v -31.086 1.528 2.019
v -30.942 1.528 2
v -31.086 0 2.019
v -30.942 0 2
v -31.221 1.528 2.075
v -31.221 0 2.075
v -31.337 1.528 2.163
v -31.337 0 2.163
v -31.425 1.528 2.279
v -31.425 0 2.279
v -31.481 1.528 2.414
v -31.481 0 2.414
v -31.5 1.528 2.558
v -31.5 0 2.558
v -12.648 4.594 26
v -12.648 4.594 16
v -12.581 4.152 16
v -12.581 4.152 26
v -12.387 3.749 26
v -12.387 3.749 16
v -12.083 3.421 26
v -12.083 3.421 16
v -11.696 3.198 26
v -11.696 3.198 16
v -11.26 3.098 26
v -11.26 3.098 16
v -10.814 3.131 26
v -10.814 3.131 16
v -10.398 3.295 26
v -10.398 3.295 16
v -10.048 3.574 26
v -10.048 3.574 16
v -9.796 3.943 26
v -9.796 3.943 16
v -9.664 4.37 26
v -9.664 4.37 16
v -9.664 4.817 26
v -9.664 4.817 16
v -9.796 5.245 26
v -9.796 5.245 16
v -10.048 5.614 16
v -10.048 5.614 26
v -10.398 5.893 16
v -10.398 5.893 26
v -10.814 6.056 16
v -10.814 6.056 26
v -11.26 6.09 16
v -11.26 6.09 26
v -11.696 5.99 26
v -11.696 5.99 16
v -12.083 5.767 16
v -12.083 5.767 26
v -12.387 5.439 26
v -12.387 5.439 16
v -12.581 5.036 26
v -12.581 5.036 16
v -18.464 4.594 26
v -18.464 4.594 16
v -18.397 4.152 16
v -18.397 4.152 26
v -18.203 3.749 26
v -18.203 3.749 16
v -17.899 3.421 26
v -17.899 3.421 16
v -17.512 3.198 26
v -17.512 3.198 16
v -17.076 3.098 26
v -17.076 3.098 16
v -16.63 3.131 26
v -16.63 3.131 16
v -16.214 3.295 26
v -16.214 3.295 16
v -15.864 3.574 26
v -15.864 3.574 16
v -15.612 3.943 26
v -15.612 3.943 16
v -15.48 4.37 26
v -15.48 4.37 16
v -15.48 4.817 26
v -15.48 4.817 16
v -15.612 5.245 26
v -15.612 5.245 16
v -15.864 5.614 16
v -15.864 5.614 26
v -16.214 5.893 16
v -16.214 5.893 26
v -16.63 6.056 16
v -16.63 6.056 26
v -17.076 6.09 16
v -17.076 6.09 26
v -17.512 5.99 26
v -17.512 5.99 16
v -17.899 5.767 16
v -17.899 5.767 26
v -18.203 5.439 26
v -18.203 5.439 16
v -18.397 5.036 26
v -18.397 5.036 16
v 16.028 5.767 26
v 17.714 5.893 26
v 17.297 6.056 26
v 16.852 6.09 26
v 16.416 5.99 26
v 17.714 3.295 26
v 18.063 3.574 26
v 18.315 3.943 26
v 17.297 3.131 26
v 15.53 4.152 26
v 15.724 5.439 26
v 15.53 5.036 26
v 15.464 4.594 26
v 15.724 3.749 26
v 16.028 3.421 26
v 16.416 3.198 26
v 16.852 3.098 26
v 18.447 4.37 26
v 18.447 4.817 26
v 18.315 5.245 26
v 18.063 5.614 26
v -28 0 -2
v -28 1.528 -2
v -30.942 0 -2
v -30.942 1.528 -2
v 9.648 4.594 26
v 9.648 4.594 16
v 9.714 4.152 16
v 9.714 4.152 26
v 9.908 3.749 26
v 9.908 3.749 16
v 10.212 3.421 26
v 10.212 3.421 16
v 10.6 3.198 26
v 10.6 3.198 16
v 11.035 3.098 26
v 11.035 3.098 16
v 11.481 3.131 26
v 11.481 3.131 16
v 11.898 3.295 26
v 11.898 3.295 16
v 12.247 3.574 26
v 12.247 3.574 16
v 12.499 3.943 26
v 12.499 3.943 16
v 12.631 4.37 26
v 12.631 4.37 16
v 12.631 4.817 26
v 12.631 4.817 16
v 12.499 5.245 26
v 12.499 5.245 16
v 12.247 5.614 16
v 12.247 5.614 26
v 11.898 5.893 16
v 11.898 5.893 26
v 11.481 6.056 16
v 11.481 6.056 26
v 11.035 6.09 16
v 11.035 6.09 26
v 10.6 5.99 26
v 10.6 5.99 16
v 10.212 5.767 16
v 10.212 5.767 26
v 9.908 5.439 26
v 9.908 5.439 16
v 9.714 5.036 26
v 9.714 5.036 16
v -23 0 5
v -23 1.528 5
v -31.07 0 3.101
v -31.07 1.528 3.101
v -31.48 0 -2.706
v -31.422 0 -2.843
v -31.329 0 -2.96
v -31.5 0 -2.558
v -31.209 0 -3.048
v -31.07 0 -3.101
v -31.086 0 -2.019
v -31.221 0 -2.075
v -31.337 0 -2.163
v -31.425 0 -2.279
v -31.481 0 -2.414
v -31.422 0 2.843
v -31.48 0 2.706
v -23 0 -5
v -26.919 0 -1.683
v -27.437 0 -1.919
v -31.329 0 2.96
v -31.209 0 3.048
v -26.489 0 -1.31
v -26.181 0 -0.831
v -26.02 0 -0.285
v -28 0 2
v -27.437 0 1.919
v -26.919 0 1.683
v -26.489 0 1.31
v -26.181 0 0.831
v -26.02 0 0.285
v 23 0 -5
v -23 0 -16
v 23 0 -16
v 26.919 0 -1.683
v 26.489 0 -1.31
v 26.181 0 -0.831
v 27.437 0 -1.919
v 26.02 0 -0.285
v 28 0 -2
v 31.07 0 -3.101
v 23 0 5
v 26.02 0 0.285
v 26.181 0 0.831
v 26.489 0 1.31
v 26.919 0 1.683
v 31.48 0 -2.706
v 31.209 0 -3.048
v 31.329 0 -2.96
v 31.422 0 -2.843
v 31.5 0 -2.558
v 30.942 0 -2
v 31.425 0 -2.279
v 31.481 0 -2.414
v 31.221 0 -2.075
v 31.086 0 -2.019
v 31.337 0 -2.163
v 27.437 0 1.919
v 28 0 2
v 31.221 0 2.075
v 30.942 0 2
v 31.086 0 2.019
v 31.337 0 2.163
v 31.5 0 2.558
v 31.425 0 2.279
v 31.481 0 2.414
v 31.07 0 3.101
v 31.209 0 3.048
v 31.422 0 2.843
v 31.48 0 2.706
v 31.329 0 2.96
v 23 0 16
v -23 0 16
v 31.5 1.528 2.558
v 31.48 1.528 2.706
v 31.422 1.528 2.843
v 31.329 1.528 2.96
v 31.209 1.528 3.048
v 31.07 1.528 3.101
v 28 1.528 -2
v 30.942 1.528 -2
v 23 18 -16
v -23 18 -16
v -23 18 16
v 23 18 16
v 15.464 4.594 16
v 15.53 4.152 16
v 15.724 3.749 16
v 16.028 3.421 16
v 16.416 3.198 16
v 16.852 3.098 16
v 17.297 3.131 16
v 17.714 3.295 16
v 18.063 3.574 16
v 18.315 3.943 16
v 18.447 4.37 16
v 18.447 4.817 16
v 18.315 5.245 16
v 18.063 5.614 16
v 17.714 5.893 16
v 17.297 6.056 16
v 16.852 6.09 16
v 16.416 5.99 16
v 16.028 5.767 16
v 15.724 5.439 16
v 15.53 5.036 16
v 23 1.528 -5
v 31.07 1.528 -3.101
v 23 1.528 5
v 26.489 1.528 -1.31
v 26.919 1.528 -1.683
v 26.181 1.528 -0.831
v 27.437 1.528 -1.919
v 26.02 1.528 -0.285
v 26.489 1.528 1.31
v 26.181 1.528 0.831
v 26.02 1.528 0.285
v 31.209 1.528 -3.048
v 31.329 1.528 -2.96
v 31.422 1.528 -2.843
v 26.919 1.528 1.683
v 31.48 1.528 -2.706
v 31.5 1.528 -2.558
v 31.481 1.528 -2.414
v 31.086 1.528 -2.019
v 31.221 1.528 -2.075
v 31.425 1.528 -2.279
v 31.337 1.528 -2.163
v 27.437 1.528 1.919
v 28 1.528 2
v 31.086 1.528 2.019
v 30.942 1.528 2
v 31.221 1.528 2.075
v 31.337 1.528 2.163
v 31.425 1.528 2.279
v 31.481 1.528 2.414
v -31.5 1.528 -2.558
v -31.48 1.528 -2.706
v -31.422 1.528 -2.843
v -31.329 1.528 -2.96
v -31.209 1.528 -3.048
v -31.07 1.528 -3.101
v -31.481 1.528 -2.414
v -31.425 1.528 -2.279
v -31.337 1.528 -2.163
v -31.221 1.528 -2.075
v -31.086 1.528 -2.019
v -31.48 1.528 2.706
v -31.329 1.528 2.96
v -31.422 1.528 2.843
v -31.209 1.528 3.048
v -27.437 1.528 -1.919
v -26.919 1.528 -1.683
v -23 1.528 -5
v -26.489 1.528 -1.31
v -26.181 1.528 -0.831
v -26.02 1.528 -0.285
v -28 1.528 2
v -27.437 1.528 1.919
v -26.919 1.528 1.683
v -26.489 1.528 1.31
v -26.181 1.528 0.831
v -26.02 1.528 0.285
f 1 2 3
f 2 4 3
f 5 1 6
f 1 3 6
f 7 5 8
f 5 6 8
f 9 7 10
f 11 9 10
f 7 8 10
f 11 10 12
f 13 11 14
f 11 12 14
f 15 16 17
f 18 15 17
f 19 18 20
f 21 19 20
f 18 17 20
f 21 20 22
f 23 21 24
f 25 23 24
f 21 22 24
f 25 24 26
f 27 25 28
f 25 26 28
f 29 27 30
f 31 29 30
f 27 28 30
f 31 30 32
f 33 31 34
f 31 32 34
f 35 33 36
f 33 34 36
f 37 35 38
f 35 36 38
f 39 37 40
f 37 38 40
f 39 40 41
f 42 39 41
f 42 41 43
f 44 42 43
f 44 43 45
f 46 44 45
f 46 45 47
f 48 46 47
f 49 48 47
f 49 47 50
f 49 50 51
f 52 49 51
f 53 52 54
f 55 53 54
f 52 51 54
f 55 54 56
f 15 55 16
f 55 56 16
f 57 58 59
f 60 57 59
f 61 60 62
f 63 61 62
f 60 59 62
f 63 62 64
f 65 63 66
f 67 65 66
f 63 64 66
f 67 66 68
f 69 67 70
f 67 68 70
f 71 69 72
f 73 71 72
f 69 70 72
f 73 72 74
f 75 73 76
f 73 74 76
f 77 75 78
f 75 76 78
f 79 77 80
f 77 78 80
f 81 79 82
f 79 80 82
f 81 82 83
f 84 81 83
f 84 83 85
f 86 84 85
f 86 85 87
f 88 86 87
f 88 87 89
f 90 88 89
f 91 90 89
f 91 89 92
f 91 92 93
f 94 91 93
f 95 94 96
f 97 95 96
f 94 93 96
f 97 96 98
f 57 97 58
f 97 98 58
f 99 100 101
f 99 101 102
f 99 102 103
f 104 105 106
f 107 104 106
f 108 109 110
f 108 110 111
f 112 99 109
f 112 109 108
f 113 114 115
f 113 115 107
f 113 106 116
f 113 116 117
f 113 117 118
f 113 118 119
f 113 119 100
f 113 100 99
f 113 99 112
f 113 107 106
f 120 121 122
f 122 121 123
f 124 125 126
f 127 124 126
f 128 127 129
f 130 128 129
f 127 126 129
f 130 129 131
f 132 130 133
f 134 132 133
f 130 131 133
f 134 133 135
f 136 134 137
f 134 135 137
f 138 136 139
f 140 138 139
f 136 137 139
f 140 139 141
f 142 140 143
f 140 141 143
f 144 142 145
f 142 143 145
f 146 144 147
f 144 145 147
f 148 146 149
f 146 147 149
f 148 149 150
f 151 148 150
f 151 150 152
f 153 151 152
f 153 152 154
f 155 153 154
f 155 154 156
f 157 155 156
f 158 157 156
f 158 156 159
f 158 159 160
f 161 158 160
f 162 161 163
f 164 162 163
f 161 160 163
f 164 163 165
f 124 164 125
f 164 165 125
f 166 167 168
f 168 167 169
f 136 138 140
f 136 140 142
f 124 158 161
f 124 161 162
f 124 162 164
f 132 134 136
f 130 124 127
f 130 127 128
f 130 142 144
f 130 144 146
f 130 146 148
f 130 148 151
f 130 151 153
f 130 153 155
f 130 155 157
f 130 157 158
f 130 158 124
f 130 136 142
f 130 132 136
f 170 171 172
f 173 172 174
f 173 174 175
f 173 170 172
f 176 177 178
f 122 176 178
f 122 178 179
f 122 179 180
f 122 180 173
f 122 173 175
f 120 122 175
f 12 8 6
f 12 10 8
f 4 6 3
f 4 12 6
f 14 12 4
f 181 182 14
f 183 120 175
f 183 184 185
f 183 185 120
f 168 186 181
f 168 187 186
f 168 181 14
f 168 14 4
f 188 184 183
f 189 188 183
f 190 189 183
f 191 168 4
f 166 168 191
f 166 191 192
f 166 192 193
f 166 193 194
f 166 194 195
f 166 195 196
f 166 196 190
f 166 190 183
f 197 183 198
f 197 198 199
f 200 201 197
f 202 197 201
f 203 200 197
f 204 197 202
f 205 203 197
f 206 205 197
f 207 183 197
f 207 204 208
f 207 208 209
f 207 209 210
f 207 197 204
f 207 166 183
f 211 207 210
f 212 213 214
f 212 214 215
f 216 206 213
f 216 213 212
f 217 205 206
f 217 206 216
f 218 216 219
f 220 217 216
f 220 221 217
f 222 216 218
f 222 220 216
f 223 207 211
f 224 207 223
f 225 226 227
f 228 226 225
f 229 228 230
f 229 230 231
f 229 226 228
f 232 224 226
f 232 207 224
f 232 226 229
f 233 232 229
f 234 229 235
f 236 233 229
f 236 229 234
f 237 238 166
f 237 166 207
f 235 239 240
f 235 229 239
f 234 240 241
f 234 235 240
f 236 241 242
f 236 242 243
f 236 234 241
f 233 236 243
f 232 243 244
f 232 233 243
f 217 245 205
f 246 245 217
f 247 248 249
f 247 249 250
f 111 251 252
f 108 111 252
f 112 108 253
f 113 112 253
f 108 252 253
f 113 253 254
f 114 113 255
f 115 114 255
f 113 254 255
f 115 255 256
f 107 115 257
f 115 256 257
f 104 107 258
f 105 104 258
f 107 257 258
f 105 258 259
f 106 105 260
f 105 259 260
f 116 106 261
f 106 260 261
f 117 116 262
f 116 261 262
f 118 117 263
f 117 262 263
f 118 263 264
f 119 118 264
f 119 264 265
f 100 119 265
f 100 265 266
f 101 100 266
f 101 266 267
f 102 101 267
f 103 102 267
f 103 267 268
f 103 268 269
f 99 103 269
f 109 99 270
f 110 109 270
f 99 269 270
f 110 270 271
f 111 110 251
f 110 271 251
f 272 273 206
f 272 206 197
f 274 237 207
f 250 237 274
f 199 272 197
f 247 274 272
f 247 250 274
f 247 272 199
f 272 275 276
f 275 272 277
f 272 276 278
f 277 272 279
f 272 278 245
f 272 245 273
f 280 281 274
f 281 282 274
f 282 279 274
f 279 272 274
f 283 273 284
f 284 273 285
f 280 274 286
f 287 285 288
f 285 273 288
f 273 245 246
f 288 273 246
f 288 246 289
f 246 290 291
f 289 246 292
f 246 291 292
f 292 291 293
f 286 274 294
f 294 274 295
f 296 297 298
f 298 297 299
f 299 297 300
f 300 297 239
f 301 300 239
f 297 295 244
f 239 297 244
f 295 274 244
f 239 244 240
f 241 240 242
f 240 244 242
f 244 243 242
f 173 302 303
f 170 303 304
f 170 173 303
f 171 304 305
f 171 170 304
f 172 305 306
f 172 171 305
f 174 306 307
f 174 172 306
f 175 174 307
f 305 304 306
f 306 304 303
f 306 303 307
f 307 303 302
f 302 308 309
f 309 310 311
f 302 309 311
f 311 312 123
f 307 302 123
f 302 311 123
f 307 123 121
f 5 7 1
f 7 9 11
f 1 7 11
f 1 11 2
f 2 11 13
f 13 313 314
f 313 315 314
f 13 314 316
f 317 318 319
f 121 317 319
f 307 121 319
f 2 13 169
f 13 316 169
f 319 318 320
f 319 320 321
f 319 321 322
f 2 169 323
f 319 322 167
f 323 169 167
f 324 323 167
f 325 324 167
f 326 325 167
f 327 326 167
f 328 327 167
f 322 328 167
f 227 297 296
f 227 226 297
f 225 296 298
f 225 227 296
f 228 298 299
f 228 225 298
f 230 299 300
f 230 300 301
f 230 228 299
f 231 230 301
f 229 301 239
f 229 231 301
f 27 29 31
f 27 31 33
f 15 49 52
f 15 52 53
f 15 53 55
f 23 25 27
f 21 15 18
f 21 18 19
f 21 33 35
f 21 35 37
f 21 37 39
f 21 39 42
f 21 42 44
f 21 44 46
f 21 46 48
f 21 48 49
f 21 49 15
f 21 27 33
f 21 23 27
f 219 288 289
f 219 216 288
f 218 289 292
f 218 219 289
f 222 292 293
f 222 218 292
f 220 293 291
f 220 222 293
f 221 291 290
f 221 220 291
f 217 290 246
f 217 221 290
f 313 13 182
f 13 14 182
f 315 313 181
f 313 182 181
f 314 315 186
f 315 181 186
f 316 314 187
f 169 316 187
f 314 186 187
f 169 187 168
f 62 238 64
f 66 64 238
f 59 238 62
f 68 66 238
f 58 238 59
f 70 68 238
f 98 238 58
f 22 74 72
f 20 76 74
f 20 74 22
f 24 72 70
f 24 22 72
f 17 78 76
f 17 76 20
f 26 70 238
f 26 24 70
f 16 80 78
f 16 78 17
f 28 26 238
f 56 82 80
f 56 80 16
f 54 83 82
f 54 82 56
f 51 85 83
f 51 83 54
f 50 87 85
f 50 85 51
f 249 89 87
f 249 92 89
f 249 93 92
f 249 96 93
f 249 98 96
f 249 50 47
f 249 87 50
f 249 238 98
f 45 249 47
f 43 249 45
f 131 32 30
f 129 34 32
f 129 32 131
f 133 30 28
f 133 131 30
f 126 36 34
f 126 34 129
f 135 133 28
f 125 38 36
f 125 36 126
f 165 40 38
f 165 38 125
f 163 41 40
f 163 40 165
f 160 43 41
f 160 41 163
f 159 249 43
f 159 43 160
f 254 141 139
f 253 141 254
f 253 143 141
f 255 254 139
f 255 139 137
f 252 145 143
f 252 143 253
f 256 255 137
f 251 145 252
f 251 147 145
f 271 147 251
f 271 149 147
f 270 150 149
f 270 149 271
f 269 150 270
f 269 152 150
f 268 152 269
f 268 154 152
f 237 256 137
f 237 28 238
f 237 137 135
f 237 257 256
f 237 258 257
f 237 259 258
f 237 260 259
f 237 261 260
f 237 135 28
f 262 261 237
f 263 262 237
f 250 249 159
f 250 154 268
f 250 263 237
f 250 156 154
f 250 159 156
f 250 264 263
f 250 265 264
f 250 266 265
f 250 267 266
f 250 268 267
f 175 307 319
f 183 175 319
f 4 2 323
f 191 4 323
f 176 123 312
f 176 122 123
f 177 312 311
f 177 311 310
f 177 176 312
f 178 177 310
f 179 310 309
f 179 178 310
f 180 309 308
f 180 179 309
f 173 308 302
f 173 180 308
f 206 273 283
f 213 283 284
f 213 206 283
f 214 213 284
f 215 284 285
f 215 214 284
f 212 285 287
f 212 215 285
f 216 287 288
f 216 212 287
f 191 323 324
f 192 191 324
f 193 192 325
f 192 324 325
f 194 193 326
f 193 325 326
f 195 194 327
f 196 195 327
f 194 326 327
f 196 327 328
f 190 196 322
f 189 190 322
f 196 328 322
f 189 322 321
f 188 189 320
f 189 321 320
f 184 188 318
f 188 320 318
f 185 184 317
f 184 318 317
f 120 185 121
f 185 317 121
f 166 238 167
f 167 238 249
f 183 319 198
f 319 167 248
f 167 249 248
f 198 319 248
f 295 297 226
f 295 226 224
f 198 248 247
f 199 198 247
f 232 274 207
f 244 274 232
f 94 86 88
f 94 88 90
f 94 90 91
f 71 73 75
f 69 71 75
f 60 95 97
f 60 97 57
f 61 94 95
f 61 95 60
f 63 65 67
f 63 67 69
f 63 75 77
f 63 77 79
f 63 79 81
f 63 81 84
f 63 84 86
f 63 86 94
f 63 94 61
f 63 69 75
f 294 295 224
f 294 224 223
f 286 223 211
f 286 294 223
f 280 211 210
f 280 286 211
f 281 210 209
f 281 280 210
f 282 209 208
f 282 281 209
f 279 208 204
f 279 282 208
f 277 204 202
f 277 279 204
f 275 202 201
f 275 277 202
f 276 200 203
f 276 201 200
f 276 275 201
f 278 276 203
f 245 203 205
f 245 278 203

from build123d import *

# Parameters (mm, degrees)
SKETCH_1_W          = 46
SKETCH_1_H          = 32
EXTRUDE_1_DEPTH     = 18
SKETCH_2_W          = 63
SKETCH_2_H          = 1.528020249
EXTRUDE_2_DEPTH     = 32
CUT_EXTRUDE_1_DEPTH = 39.981740814
FILLET_1_R          = 0.558031
FILLET_2_R          = 0.558031
FILLET_3_R          = 0.558031
FILLET_4_R          = 0.558031
SKETCH_5_R          = 1.5
EXTRUDE_3_DEPTH     = 10


with BuildPart() as part:
    # 草图1 → 凸台-拉伸1 (new body)
    with BuildSketch(Plane(origin=(0, 0, 0), x_dir=(1, 0, 0), z_dir=(0, 1, 0))):
        Rectangle(SKETCH_1_W, SKETCH_1_H)
    extrude(amount=EXTRUDE_1_DEPTH)

    # 草图2 → 凸台-拉伸2 (add, through all)
    with BuildSketch(Plane.XY.offset(16)):
        with Locations((0, 0.764010125)):
            Rectangle(SKETCH_2_W, SKETCH_2_H)
    extrude(amount=-EXTRUDE_2_DEPTH)

    # 草图3 → 切除-拉伸1 (cut, through all)
    with BuildSketch(Plane(origin=(0, 1.528020249, 0), x_dir=(1, 0, 0), z_dir=(0, 1, 0))):
        Polygon((-31.5, 16), (-31.5, 3), (-23, 5), (-23, 16), align=None)
        Polygon((-23, -5), (-31.5, -3), (-31.5, -16), (-23, -16), align=None)
        with BuildLine():
            ThreePointArc((-28, -2), (-26, 0), (-28, 2))
            Line((-28, 2), (-31.5, 2))
            Line((-31.5, 2), (-31.5, -2))
            Line((-31.5, -2), (-28, -2))
        make_face()
    cut_extrude_1 = extrude(amount=-CUT_EXTRUDE_1_DEPTH, mode=Mode.SUBTRACT)

    # 圆角1
    fillet_1_edges = [part.edges().sort_by_distance(p)[0] for p in [
        (-31.5, 0.764010125, -3),
        (-31.5, 0.764010125, -2),
    ]]
    fillet(fillet_1_edges, radius=FILLET_1_R)

    # 圆角2
    fillet_2_edges = [part.edges().sort_by_distance(p)[0] for p in [
        (-31.5, 0.764010125, 3),
        (-31.5, 0.764010125, 2),
    ]]
    fillet(fillet_2_edges, radius=FILLET_2_R)

    # 镜向4: 切除-拉伸1 across plane
    add(cut_extrude_1.mirror(Plane(origin=(0, 0, 0), x_dir=(0, 0, 1), z_dir=(1, 0, 0))), mode=Mode.SUBTRACT)

    # 圆角3
    fillet_3_edges = [part.edges().sort_by_distance(p)[0] for p in [
        (31.5, 0.764010125, -3),
        (31.5, 0.764010125, -2),
    ]]
    fillet(fillet_3_edges, radius=FILLET_3_R)

    # 圆角4
    fillet_4_edges = [part.edges().sort_by_distance(p)[0] for p in [
        (31.5, 0.764010125, 3),
        (31.5, 0.764010125, 2),
    ]]
    fillet(fillet_4_edges, radius=FILLET_4_R)

    # 草图5 → 凸台-拉伸3 (add)
    with BuildSketch(Plane.XY.offset(16)):
        with Locations(Location((-16.963649323, 4.593857319, 0), (0, 0, 180))):
            Circle(SKETCH_5_R)
        with Locations(Location((-11.147540984, 4.593857319, 0), (0, 0, 180))):
            Circle(SKETCH_5_R)
        with Locations(Location((11.147540984, 4.593857319, 0), (0, 0, 180))):
            Circle(SKETCH_5_R)
        with Locations(Location((16.963649323, 4.593857319, 0), (0, 0, 180))):
            Circle(SKETCH_5_R)
    extrude(amount=EXTRUDE_3_DEPTH)


solid = part.part
